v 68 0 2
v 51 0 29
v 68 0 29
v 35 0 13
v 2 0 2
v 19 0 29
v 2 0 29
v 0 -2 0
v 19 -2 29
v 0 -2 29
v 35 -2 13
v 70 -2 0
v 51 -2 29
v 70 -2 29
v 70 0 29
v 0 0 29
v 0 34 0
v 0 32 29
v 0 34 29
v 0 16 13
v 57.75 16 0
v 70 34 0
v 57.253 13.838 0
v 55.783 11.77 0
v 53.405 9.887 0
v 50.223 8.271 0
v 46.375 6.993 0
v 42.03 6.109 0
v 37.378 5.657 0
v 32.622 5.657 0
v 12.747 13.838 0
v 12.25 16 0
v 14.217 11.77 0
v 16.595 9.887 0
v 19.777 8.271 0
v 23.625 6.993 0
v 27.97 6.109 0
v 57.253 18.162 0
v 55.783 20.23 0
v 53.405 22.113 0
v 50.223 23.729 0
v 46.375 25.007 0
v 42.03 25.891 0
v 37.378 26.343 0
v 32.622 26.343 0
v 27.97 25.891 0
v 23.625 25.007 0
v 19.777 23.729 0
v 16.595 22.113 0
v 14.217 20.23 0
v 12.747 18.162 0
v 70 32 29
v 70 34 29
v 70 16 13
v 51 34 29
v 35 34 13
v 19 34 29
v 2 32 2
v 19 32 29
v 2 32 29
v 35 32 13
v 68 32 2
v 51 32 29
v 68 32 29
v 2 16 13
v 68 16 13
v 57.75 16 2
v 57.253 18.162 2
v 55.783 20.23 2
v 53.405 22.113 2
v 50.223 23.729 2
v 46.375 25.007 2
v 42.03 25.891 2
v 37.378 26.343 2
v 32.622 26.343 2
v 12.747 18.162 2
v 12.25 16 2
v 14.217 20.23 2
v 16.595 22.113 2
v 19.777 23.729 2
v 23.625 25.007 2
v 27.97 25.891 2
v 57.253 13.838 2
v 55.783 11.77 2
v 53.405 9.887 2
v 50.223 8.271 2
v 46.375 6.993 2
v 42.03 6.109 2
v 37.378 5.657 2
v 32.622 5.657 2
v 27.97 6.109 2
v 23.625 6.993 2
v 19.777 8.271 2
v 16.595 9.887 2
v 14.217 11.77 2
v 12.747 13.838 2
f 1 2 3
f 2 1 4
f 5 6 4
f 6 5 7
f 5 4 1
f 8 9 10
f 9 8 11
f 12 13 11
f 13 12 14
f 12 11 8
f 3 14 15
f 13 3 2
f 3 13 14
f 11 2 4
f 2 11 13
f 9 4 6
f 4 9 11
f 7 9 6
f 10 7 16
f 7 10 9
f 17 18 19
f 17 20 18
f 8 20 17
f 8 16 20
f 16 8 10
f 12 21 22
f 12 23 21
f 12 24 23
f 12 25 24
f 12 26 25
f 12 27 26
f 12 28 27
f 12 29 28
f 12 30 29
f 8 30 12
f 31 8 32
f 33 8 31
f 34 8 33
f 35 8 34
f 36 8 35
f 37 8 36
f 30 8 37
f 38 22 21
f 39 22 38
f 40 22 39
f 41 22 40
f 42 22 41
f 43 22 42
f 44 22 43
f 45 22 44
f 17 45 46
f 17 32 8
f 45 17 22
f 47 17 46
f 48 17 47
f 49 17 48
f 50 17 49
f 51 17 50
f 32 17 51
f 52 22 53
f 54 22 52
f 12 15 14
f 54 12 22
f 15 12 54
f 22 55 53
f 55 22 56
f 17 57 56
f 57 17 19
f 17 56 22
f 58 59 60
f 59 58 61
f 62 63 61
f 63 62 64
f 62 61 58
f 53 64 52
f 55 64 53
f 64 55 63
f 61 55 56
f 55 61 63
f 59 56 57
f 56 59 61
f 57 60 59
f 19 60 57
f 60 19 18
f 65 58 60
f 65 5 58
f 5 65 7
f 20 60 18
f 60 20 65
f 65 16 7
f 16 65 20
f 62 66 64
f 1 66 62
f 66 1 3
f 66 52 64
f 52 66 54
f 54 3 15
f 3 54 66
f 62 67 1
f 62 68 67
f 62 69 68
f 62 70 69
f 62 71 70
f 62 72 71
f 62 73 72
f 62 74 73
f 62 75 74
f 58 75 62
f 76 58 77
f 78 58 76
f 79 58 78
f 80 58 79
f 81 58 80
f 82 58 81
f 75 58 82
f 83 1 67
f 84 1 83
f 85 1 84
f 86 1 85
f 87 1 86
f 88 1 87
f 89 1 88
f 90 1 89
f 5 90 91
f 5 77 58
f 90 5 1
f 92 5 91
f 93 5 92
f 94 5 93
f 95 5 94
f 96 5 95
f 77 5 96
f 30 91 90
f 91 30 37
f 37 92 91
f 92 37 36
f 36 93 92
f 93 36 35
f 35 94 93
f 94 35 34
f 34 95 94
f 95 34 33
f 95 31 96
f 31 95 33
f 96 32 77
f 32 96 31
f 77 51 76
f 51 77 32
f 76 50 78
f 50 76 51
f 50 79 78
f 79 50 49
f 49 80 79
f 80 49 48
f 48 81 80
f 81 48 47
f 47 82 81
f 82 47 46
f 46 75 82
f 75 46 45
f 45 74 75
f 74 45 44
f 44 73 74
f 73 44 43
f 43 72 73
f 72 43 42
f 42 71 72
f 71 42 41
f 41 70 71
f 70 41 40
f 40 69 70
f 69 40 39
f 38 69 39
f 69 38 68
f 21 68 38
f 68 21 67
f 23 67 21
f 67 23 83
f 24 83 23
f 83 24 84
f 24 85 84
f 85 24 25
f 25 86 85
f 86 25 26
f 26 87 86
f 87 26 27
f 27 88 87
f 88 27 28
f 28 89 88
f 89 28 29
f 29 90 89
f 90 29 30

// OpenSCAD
thickness = 2;
length = 70;
width = 32;
bottomHolePercent = 65;

height = width * 0.75 + 5;
incut = width;
circleDiameter = width * bottomHolePercent / 100;

linear_extrude(height = thickness)
        difference() {
            square([length,width]);
            translate([length/2,width/2]) scale([length/width,1]) circle(circleDiameter/2);
        }

for(i=[0,1]) {
    translate([0,i*(thickness+width),0])
    rotate([90,0,0]) linear_extrude(height = thickness) polygon(points=[[0,0],[0,height],[length/2-incut/2,height],[length/2,height-incut/2],[length/2+incut/2,height],[length,height],[length,0]]);
}

for (i = [0:1]) {
    translate([thickness+i*(length-thickness),0,0]) rotate([0,-90,0])
    linear_extrude(height = thickness) polygon(points=[[0,0],[height,0],[height-width/2,width/2],[height,width],[0,width]]);
}
